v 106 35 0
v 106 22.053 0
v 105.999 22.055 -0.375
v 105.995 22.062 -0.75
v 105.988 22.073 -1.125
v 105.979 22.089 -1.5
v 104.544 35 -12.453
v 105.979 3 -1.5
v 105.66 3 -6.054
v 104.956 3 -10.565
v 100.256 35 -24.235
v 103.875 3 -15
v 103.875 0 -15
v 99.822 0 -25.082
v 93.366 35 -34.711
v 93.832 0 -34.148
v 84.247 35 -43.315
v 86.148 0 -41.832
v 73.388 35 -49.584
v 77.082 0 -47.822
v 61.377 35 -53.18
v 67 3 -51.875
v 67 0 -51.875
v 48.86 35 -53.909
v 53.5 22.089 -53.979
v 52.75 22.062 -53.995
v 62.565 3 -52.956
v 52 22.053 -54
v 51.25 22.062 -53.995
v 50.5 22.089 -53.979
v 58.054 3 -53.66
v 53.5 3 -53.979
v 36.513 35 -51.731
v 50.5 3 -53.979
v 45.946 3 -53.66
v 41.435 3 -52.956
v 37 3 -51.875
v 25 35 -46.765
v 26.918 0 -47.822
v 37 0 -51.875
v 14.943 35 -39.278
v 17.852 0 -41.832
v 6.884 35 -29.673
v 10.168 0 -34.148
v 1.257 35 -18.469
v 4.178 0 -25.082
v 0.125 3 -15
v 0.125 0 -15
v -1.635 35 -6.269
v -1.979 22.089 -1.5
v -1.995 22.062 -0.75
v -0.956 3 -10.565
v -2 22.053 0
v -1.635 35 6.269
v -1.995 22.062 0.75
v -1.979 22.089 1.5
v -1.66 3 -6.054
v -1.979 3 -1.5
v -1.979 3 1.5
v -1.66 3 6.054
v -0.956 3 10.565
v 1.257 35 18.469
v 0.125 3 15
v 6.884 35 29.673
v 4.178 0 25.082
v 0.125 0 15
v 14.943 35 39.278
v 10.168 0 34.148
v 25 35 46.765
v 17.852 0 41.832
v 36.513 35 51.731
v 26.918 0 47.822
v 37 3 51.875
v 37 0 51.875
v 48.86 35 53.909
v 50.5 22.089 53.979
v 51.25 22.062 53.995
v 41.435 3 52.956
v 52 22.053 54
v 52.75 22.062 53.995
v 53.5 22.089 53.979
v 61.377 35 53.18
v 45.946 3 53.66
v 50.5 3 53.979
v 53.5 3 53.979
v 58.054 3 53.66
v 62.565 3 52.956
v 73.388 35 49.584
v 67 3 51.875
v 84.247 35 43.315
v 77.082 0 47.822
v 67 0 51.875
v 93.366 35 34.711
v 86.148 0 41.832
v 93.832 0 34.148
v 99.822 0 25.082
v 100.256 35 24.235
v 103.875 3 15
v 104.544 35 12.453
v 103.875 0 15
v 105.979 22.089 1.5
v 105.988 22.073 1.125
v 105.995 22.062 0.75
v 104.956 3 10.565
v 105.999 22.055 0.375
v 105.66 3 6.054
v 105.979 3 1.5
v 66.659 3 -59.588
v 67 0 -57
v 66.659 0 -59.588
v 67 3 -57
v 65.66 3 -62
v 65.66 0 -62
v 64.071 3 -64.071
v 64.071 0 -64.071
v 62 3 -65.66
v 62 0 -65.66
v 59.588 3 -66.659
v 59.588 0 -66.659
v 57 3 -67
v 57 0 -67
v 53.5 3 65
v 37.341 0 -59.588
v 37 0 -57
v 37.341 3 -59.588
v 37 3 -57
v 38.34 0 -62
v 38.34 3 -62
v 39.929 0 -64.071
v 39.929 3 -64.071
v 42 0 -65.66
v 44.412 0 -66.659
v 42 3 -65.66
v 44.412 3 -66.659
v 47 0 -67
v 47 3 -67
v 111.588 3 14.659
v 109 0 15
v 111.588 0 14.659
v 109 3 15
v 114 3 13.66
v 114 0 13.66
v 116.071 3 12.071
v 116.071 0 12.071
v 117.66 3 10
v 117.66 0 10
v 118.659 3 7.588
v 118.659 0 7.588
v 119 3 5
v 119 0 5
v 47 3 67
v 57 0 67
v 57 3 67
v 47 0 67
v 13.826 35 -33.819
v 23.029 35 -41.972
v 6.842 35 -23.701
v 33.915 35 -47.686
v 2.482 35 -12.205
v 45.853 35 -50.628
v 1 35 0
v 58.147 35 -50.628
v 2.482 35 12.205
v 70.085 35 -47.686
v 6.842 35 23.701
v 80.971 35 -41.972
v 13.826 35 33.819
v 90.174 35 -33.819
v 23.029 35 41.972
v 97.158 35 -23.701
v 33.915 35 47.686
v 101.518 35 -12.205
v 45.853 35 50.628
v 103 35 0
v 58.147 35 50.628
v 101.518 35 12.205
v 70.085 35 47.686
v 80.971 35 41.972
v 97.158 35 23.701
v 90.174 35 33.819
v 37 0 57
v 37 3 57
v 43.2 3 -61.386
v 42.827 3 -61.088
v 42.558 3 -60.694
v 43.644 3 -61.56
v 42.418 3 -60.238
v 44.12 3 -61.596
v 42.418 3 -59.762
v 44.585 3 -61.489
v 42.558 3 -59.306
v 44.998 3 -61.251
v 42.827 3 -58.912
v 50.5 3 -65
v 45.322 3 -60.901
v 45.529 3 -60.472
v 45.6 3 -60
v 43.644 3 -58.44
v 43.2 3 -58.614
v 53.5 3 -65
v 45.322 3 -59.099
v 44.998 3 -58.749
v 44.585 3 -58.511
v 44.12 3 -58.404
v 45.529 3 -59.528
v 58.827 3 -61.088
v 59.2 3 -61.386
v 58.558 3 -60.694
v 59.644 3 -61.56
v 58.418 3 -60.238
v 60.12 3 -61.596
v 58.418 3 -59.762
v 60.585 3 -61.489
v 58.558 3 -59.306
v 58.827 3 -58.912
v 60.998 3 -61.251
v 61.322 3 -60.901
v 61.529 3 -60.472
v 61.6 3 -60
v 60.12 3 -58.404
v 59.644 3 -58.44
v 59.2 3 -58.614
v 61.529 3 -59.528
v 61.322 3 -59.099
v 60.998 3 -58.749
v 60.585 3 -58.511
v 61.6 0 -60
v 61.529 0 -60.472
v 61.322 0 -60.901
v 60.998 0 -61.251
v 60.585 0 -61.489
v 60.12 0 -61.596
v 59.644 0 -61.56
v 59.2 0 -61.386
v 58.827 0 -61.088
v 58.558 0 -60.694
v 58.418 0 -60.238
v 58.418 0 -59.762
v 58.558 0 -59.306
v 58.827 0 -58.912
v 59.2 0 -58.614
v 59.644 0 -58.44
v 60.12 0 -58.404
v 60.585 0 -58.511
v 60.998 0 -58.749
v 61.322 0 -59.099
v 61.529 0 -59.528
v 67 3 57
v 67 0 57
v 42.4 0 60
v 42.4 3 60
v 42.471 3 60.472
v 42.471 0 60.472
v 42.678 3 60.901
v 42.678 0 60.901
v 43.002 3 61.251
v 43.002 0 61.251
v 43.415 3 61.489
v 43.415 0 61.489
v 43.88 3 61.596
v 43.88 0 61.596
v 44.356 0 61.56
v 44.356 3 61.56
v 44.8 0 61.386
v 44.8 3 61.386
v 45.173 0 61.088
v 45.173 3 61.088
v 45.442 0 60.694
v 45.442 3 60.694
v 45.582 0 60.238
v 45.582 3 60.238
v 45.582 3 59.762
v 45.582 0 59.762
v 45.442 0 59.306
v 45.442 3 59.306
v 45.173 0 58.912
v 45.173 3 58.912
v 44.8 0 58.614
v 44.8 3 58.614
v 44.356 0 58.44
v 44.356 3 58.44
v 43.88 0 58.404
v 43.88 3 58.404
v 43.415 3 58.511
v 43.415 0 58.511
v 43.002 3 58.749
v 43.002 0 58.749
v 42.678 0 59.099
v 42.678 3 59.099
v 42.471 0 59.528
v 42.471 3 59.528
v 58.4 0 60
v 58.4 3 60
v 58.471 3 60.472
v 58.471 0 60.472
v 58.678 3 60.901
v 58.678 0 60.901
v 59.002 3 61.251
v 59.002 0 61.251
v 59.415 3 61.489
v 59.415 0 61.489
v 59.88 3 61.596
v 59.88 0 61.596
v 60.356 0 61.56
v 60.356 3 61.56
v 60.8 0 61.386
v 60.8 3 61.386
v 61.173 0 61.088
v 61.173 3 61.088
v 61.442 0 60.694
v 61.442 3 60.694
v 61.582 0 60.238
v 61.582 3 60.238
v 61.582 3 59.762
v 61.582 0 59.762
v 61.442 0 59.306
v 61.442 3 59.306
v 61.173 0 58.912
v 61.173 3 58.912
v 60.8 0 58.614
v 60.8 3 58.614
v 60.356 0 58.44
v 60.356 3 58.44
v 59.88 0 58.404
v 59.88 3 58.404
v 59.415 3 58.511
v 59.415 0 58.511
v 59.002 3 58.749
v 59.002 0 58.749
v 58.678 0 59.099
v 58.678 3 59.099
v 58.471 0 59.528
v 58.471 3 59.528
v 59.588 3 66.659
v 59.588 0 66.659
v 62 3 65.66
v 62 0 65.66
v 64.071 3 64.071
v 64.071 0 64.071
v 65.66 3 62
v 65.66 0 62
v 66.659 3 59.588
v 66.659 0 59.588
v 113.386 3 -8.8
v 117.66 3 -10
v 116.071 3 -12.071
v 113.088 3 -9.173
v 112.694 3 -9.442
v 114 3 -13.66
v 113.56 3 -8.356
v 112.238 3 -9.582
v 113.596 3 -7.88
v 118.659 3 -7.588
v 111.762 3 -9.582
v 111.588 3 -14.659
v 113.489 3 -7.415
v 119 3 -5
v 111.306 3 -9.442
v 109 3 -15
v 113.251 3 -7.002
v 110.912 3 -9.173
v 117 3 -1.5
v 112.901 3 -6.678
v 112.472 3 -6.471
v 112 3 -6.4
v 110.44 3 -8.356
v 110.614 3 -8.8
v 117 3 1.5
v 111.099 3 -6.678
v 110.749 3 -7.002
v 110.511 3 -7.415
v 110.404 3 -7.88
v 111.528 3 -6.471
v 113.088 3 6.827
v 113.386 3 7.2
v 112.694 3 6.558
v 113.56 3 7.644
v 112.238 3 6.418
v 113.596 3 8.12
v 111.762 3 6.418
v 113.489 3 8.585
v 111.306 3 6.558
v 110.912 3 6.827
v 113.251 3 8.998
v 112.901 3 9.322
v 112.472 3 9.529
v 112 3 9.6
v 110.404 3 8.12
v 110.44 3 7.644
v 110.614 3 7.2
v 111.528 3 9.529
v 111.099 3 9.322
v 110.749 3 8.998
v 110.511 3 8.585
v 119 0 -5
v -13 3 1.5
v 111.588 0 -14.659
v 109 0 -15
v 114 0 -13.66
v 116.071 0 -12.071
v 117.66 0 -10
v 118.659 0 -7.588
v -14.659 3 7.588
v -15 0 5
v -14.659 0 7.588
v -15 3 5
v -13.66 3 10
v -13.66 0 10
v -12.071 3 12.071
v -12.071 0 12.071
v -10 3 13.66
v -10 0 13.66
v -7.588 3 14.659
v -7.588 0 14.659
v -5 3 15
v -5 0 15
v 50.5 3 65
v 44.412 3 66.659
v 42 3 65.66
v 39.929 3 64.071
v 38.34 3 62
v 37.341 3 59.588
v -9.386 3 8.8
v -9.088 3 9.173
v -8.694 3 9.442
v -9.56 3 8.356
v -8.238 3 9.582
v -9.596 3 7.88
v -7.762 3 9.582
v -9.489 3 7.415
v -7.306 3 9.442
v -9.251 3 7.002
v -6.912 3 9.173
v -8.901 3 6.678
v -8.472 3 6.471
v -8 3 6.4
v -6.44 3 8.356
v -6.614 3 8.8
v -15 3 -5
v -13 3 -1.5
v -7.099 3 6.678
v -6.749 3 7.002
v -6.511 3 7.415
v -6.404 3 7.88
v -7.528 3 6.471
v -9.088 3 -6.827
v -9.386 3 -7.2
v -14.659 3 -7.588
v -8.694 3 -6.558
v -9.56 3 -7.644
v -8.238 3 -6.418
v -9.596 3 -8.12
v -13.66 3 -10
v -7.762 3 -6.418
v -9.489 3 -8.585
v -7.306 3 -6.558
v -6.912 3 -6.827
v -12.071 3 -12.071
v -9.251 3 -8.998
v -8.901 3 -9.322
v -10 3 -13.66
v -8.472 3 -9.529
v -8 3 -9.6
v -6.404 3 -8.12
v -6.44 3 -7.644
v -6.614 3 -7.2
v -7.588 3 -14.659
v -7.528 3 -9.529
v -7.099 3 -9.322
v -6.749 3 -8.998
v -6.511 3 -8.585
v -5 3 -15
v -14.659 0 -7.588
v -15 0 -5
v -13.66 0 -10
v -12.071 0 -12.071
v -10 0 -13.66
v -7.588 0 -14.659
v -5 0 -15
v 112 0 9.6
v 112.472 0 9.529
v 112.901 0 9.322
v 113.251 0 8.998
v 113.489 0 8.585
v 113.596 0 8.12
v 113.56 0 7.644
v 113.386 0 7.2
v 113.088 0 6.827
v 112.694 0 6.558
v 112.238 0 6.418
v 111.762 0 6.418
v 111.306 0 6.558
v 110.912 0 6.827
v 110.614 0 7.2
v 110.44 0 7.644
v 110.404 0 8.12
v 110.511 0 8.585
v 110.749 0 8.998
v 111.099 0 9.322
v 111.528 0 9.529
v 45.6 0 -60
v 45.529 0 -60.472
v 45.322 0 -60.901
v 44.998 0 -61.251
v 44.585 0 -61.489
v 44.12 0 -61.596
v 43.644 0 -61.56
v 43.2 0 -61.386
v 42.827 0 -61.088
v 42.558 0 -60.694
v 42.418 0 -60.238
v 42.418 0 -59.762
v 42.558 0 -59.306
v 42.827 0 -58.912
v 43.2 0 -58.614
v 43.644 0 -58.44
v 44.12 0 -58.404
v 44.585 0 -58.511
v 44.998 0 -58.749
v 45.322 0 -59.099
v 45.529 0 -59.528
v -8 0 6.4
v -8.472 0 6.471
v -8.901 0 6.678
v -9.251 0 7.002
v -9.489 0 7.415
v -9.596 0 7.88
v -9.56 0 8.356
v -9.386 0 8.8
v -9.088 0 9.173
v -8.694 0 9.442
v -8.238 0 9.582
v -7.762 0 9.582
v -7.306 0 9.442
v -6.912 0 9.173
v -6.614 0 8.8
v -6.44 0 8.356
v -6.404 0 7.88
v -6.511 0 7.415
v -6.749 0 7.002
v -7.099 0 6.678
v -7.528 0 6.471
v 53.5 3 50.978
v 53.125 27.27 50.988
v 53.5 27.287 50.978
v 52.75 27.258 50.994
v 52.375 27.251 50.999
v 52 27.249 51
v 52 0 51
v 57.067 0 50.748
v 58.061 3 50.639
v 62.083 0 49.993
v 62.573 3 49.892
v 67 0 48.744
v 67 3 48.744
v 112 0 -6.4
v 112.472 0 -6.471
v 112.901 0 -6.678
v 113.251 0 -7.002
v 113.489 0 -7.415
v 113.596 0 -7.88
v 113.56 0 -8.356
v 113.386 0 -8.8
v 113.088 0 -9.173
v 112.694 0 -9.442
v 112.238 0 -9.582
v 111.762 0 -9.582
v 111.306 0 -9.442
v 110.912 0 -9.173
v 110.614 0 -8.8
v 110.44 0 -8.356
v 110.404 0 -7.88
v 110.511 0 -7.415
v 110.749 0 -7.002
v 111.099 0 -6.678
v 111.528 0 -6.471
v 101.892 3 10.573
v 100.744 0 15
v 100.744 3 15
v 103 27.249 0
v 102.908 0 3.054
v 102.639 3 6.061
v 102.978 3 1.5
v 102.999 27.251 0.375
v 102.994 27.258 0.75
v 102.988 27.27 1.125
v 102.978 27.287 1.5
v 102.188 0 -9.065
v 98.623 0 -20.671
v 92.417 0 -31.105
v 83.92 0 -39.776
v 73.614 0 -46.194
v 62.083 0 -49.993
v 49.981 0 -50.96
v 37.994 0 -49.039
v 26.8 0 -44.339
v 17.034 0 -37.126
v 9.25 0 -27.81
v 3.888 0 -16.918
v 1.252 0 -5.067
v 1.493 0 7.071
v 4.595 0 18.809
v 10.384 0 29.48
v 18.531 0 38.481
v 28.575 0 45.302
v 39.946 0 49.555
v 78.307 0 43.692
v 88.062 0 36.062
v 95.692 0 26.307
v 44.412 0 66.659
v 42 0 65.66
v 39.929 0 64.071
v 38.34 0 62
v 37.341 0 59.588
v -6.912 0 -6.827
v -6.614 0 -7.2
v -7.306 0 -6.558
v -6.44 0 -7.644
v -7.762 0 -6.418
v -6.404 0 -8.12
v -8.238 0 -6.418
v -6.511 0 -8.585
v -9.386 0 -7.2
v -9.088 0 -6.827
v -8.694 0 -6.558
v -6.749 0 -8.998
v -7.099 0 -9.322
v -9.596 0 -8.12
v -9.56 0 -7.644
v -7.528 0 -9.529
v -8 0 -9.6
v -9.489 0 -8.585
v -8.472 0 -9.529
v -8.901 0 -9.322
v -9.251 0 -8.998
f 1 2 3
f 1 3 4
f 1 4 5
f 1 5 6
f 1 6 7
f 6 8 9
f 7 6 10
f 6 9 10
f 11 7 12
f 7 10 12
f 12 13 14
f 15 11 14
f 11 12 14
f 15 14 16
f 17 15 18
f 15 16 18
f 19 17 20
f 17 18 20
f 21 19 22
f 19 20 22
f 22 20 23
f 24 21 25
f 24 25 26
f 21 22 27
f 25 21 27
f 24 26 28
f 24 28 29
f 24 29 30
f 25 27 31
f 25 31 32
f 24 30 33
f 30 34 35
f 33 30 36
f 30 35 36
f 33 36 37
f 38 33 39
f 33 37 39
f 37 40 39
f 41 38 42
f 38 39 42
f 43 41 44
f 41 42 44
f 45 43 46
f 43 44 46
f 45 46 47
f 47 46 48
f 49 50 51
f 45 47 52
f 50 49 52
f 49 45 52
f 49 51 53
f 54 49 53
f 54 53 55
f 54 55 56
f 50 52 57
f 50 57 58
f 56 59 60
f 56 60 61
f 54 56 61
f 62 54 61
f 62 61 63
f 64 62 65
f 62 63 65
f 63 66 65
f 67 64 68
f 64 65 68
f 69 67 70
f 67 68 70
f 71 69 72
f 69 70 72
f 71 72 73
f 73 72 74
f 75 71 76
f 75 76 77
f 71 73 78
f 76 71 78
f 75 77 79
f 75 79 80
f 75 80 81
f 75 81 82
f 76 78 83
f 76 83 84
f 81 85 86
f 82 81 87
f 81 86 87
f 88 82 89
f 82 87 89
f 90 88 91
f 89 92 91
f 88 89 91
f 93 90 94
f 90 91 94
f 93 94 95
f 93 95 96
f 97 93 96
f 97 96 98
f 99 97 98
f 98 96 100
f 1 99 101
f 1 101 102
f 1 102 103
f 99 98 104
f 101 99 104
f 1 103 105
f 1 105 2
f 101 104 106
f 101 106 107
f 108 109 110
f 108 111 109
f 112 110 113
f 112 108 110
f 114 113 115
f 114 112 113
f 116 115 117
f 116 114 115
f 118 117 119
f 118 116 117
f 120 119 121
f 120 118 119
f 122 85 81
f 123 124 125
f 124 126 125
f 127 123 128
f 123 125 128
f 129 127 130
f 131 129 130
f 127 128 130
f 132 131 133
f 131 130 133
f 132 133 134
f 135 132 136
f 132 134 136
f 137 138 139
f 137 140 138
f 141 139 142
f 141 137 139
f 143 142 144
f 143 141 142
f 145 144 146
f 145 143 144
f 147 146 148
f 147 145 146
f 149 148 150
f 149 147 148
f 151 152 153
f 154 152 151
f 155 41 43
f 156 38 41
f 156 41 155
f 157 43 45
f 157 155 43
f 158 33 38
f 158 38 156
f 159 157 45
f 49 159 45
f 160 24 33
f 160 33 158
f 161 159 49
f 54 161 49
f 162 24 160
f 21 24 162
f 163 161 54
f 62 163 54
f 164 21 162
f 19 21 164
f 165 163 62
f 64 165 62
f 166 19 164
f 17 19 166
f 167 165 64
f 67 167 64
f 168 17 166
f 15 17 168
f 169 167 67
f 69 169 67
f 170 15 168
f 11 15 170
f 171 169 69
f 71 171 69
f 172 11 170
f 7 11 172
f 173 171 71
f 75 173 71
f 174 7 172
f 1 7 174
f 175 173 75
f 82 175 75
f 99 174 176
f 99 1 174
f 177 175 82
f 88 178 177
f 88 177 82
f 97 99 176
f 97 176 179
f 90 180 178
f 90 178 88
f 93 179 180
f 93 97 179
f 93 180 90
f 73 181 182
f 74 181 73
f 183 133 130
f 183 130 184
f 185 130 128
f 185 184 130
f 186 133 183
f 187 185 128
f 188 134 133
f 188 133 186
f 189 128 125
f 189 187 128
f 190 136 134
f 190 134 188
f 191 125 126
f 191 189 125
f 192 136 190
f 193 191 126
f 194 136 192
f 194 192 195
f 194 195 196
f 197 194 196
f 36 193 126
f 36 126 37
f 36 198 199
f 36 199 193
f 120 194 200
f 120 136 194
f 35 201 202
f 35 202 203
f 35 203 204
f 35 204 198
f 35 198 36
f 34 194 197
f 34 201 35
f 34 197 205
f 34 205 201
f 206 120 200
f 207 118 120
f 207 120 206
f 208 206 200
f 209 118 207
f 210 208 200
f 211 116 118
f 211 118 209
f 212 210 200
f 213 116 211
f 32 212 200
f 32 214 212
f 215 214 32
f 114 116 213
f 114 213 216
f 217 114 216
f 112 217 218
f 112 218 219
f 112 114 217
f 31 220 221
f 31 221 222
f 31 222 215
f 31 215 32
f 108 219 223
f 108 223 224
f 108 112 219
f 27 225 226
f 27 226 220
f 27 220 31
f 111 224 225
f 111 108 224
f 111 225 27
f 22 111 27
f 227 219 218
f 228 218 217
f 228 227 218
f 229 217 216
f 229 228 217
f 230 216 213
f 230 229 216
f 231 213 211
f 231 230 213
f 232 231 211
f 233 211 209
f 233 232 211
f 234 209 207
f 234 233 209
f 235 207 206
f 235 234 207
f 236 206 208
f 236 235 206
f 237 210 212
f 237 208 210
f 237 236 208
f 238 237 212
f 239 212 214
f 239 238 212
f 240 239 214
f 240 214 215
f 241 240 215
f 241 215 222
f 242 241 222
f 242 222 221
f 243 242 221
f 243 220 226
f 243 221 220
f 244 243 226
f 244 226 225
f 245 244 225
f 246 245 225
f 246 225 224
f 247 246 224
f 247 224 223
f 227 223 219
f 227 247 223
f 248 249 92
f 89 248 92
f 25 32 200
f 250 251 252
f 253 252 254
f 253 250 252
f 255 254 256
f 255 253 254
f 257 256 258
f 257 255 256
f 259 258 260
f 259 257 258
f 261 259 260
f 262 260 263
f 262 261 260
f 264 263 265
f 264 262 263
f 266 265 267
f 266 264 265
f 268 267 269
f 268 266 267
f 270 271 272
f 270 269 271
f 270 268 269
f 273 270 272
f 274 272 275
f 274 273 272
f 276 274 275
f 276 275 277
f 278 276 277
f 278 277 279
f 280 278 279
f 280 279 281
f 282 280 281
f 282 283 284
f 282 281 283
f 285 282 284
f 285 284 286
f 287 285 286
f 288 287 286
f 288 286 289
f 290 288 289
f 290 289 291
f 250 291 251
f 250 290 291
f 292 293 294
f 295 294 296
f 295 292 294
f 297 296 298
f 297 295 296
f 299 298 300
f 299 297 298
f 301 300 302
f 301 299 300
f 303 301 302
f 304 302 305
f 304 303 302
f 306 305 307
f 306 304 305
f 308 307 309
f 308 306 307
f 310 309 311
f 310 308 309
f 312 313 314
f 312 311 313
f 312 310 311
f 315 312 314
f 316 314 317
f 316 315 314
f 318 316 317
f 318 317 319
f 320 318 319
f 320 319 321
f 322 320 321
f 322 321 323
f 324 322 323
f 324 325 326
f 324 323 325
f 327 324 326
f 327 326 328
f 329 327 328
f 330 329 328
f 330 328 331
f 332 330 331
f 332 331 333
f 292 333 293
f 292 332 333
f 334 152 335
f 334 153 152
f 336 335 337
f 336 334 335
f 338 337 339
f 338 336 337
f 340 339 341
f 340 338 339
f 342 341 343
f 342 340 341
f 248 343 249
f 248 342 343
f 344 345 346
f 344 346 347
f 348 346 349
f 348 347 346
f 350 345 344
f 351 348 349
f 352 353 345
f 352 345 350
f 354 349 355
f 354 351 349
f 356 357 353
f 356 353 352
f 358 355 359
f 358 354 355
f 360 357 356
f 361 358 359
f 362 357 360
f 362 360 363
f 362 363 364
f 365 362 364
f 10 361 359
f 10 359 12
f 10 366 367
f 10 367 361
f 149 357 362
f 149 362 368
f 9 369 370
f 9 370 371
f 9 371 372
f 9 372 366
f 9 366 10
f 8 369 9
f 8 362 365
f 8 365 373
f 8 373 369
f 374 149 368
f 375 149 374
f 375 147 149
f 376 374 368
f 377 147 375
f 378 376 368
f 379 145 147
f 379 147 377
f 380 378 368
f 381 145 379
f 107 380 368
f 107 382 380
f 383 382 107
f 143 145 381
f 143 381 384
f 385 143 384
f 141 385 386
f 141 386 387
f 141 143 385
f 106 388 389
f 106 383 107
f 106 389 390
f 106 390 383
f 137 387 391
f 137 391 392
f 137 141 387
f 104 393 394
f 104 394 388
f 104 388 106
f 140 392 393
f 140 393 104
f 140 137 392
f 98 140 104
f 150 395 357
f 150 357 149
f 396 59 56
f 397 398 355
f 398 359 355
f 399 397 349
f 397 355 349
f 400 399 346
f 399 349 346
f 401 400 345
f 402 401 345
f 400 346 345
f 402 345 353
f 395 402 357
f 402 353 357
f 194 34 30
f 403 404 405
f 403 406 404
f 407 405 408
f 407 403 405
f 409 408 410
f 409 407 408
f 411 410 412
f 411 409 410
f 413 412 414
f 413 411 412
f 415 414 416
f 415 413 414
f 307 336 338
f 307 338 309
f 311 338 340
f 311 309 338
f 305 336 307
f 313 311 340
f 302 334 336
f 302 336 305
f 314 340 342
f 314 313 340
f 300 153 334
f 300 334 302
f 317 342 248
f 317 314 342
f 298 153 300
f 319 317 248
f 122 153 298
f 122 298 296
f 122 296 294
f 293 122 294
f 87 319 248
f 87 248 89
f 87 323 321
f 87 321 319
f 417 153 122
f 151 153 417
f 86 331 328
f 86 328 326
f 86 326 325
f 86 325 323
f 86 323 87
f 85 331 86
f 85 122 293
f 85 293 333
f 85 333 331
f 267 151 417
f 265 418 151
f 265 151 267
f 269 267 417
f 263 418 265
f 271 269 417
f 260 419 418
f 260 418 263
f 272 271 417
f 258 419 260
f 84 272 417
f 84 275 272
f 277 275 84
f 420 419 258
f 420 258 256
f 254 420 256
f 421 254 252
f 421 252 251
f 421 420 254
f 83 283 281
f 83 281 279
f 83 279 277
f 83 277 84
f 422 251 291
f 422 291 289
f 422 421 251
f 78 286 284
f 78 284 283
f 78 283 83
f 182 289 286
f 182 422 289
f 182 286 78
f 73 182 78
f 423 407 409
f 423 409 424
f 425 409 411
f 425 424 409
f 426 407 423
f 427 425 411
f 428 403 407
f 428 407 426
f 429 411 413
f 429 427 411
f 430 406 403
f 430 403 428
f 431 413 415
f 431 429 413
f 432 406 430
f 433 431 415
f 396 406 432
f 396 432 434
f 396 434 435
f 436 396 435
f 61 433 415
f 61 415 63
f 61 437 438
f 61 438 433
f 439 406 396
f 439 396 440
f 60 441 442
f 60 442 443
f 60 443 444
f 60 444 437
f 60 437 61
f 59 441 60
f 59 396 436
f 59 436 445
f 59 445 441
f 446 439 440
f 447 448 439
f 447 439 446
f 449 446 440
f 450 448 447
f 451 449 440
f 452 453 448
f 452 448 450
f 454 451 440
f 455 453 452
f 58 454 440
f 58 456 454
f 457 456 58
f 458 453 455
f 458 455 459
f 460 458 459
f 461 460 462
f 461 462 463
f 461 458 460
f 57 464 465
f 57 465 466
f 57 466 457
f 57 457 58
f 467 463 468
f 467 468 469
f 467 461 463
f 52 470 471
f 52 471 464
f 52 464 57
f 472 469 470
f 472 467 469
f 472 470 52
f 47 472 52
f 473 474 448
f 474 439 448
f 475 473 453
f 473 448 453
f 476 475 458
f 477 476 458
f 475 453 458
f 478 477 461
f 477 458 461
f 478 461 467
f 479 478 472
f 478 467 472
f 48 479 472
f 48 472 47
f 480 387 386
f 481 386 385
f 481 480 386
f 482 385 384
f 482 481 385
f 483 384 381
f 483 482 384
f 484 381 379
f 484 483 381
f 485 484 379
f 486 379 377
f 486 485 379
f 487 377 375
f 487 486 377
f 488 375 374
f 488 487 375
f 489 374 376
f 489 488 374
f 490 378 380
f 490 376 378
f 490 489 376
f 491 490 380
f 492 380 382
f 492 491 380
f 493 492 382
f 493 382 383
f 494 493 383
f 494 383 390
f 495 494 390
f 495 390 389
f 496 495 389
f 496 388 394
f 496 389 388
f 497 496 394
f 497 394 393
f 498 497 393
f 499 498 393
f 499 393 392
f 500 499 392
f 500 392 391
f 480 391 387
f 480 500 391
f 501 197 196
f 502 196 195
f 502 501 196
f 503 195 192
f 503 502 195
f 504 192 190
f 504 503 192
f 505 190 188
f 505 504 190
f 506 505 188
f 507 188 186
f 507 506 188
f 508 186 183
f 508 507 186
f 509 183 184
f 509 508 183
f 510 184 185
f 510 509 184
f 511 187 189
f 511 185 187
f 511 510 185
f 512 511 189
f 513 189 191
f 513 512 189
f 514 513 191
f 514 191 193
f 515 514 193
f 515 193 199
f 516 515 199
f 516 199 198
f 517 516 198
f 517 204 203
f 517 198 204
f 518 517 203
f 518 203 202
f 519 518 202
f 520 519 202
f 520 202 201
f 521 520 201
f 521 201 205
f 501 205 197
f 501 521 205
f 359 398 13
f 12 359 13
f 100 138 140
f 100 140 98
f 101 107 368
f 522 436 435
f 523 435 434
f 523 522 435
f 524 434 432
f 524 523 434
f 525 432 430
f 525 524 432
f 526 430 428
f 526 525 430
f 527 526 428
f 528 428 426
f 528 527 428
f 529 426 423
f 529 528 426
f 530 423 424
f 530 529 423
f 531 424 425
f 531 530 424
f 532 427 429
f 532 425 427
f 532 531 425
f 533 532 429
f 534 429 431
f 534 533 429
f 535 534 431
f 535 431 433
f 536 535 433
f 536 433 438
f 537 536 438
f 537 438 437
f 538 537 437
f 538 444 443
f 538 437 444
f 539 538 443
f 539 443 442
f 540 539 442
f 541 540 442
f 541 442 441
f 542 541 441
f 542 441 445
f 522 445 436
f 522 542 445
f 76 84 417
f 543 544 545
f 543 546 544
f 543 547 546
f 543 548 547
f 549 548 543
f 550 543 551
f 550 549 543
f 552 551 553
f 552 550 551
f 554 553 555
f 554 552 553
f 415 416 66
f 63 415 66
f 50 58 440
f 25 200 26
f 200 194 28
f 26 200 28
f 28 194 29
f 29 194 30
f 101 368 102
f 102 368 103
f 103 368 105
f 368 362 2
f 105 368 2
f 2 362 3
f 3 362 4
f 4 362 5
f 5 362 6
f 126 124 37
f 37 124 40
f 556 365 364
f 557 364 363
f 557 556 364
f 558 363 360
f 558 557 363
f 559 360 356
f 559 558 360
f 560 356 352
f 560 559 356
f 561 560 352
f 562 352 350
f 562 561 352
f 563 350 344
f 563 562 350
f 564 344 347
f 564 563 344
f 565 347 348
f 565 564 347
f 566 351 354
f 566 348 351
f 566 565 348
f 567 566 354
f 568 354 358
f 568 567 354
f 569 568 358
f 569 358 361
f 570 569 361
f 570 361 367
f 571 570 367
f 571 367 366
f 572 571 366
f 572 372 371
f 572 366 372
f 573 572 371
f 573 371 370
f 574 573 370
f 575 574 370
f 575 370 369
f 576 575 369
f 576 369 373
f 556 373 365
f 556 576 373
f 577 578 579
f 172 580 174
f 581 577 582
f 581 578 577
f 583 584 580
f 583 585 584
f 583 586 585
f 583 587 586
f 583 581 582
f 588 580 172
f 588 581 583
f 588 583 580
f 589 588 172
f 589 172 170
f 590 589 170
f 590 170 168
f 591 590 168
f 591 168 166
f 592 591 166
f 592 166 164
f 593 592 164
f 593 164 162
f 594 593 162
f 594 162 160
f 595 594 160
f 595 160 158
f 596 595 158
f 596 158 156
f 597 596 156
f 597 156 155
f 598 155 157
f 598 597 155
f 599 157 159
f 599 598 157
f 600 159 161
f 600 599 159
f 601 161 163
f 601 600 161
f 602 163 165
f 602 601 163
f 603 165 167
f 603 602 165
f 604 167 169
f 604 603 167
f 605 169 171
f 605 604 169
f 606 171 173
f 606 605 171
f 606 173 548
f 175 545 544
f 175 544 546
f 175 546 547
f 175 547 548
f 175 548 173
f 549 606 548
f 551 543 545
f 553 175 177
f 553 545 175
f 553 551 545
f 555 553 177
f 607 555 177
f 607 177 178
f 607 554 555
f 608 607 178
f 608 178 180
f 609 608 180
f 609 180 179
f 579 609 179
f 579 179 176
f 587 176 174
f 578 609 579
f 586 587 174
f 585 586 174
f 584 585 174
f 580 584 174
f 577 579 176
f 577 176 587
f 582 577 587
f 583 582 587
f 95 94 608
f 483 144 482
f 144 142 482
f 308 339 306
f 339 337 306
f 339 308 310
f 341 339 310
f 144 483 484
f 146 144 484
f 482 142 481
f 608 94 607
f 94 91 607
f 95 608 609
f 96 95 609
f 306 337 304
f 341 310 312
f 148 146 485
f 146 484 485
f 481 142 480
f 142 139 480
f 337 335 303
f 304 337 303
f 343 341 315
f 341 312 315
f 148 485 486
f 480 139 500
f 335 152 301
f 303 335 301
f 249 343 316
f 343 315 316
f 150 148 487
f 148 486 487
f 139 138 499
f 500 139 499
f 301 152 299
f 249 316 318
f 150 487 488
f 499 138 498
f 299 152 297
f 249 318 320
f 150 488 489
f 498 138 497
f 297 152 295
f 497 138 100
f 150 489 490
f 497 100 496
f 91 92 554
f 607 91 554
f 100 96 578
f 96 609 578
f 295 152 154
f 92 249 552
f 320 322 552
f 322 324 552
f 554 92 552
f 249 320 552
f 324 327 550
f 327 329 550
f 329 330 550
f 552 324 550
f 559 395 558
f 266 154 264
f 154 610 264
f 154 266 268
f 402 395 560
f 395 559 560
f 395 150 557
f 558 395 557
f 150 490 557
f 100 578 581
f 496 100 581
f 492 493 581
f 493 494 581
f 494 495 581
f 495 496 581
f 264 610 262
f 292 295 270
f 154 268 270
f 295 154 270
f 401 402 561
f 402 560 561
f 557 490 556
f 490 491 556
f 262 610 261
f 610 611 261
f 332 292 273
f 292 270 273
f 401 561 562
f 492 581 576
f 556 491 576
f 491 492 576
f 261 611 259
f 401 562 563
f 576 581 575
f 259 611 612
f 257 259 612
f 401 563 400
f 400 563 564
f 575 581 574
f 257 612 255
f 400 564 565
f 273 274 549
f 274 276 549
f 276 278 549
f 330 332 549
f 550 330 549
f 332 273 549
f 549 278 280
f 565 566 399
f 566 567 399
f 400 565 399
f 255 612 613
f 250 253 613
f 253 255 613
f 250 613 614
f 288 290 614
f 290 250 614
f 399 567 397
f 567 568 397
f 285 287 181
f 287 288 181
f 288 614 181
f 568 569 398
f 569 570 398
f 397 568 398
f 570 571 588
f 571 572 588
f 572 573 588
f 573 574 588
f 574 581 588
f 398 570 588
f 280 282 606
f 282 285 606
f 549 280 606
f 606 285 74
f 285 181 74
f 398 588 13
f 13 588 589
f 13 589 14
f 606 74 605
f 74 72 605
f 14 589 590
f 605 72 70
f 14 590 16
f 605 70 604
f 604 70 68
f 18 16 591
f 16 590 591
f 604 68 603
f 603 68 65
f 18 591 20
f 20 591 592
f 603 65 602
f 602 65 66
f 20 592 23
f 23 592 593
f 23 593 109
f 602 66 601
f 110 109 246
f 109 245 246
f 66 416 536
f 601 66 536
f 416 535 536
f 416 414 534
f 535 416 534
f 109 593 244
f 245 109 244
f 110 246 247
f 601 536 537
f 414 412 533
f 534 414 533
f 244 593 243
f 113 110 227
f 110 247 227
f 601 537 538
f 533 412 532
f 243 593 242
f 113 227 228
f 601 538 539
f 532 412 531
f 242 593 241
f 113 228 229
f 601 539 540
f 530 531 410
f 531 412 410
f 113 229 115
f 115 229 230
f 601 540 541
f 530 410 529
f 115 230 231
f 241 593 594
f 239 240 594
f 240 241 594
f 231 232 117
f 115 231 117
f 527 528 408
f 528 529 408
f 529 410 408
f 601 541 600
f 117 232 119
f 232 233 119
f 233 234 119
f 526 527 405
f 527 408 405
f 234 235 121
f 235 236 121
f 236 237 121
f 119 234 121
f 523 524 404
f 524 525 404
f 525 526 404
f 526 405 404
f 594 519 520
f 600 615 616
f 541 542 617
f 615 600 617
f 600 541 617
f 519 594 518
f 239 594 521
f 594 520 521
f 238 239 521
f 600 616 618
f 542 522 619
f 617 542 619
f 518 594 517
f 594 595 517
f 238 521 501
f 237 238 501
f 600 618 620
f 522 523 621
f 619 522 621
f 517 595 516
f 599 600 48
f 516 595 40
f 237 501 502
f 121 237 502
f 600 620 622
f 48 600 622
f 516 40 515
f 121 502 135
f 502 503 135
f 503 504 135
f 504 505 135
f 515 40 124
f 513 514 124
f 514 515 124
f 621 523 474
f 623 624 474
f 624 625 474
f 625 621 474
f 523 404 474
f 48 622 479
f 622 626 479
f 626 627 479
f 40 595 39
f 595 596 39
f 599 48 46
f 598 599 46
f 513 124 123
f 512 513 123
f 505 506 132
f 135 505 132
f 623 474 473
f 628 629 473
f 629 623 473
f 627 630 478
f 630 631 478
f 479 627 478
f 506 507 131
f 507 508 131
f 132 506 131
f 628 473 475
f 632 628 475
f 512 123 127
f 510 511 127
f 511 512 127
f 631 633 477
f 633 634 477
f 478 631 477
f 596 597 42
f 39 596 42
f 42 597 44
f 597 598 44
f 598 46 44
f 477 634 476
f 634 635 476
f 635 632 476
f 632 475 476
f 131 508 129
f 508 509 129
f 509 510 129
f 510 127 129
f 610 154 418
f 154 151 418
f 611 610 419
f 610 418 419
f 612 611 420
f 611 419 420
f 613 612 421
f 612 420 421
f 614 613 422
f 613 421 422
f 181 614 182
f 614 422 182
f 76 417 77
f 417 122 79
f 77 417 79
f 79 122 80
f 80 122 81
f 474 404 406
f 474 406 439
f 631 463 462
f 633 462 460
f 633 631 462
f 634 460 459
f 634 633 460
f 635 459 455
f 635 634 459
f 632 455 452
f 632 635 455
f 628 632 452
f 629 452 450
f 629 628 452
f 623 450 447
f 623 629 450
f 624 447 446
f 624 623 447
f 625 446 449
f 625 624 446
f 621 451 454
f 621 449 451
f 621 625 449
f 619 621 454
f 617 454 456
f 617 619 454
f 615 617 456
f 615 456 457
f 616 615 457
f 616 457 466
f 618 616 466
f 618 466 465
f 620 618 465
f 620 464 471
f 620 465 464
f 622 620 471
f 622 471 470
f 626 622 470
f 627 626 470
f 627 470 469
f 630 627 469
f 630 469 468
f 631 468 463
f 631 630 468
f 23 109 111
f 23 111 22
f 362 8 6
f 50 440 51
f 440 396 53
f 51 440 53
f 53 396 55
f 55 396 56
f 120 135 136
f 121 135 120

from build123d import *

# Parameters (mm, degrees)
SKETCH_1_W                       = 30
SKETCH_1_H                       = 30
EXTRUDE_1_DEPTH                  = 3
EXTRUDE_2_DEPTH                  = 1.5
FILLET_2_R                       = 10
SKETCH_4_R                       = 51
CUT_EXTRUDE_1_DEPTH              = 80
SKETCH_5_R                       = 1.6
CUT_EXTRUDE_3_DEPTH              = 10
SHEET_EXTRUDE_2_1_DEPTH          = 35
THICKEN_2_T2                     = 3
PATTERN_CIRCULAR_8_COUNT         = 4
FILLET_2_OF_PATTERN_CIRCULAR_8_R = 10
SKETCH_6_R                       = 51
CUT_EXTRUDE_4_DEPTH              = 35


with BuildPart() as part:
    # 草图1 → 凸台-拉伸1 (new body)
    with BuildSketch(Plane(origin=(0, 0, 0), x_dir=(1, 0, 0), z_dir=(0, 1, 0))):
        Rectangle(SKETCH_1_W, SKETCH_1_H)
    extrude_1 = extrude(amount=EXTRUDE_1_DEPTH)

    # 草图3 → 凸台-拉伸2 (add, symmetric)
    with BuildSketch(Plane.XY):
        Polygon((-13, 3), (4.320508076, 33), (50, 33), (50, 3), align=None)
    extrude_2 = extrude(amount=EXTRUDE_2_DEPTH, both=True)

    # 圆角2
    fillet_2_edges = [part.edges().sort_by_distance(p)[0] for p in [
        (-15, 1.5, 15),
        (-15, 1.5, -15),
    ]]
    fillet(fillet_2_edges, radius=FILLET_2_R)

    # 草图4 → 切除-拉伸1 (cut)
    with BuildSketch(Plane(origin=(0, 0, 0), x_dir=(1, 0, 0), z_dir=(0, 1, 0))):
        with Locations((52, 0)):
            Circle(SKETCH_4_R)
    extrude(amount=CUT_EXTRUDE_1_DEPTH, mode=Mode.SUBTRACT)

    # 草图5 → 切除-拉伸3 (cut)
    with BuildSketch(Plane(origin=(0, 0, 0), x_dir=(1, 0, 0), z_dir=(0, 1, 0))):
        with Locations(Location((-8, 8, 0), (0, 0, 90))):
            Circle(SKETCH_5_R)
        with Locations(Location((-8, -8, 0), (0, 0, 90))):
            Circle(SKETCH_5_R)
    cut_extrude_3 = extrude(amount=CUT_EXTRUDE_3_DEPTH, mode=Mode.SUBTRACT)

    # Sheet 凸台-拉伸2: a surface, the sketch's curves swept straight by 35 mm
    with BuildLine(Plane(origin=(0, 0, 0), x_dir=(1, 0, 0), z_dir=(0, 1, 0)), mode=Mode.PRIVATE) as sheet_extrude_2_1_path:
        CenterArc((52, 0), 51, 0, 360)
    sheet_extrude_2_1 = Shell.extrude(sheet_extrude_2_1_path.wire(), (0 * SHEET_EXTRUDE_2_1_DEPTH, 1 * SHEET_EXTRUDE_2_1_DEPTH, 0 * SHEET_EXTRUDE_2_1_DEPTH))
    add(Solid.thicken(sheet_extrude_2_1, -THICKEN_2_T2))

    # 阵列(圆周)8: 凸台-拉伸1, 凸台-拉伸2, 切除-拉伸3 ×4 about axis
    pattern_circular_8_axis = Axis((52, 0, 0), (0, 1, 0))
    add([extrude_1.rotate(pattern_circular_8_axis, i * 360 / PATTERN_CIRCULAR_8_COUNT) for i in range(1, PATTERN_CIRCULAR_8_COUNT)])
    add([extrude_2.rotate(pattern_circular_8_axis, i * 360 / PATTERN_CIRCULAR_8_COUNT) for i in range(1, PATTERN_CIRCULAR_8_COUNT)])
    add([cut_extrude_3.rotate(pattern_circular_8_axis, i * 360 / PATTERN_CIRCULAR_8_COUNT) for i in range(1, PATTERN_CIRCULAR_8_COUNT)], mode=Mode.SUBTRACT)

    # 圆角2 of 阵列(圆周)8
    fillet_2_of_pattern_circular_8_edges = [part.edges().sort_by_distance(p)[0] for p in [
        (67, 1.5, 67),
        (37, 1.5, 67),
        (119, 1.5, -15),
        (119, 1.5, 15),
        (37, 1.5, -67),
        (67, 1.5, -67),
    ]]
    fillet(fillet_2_of_pattern_circular_8_edges, radius=FILLET_2_OF_PATTERN_CIRCULAR_8_R)

    # 草图6 → 切除-拉伸4 (cut)
    with BuildSketch(Plane(origin=(0, 0, 0), x_dir=(1, 0, 0), z_dir=(0, 1, 0))):
        with Locations(Location((52, 0, 0), (0, 0, 270))):
            Circle(SKETCH_6_R)
    extrude(amount=CUT_EXTRUDE_4_DEPTH, mode=Mode.SUBTRACT)


solid = part.part
